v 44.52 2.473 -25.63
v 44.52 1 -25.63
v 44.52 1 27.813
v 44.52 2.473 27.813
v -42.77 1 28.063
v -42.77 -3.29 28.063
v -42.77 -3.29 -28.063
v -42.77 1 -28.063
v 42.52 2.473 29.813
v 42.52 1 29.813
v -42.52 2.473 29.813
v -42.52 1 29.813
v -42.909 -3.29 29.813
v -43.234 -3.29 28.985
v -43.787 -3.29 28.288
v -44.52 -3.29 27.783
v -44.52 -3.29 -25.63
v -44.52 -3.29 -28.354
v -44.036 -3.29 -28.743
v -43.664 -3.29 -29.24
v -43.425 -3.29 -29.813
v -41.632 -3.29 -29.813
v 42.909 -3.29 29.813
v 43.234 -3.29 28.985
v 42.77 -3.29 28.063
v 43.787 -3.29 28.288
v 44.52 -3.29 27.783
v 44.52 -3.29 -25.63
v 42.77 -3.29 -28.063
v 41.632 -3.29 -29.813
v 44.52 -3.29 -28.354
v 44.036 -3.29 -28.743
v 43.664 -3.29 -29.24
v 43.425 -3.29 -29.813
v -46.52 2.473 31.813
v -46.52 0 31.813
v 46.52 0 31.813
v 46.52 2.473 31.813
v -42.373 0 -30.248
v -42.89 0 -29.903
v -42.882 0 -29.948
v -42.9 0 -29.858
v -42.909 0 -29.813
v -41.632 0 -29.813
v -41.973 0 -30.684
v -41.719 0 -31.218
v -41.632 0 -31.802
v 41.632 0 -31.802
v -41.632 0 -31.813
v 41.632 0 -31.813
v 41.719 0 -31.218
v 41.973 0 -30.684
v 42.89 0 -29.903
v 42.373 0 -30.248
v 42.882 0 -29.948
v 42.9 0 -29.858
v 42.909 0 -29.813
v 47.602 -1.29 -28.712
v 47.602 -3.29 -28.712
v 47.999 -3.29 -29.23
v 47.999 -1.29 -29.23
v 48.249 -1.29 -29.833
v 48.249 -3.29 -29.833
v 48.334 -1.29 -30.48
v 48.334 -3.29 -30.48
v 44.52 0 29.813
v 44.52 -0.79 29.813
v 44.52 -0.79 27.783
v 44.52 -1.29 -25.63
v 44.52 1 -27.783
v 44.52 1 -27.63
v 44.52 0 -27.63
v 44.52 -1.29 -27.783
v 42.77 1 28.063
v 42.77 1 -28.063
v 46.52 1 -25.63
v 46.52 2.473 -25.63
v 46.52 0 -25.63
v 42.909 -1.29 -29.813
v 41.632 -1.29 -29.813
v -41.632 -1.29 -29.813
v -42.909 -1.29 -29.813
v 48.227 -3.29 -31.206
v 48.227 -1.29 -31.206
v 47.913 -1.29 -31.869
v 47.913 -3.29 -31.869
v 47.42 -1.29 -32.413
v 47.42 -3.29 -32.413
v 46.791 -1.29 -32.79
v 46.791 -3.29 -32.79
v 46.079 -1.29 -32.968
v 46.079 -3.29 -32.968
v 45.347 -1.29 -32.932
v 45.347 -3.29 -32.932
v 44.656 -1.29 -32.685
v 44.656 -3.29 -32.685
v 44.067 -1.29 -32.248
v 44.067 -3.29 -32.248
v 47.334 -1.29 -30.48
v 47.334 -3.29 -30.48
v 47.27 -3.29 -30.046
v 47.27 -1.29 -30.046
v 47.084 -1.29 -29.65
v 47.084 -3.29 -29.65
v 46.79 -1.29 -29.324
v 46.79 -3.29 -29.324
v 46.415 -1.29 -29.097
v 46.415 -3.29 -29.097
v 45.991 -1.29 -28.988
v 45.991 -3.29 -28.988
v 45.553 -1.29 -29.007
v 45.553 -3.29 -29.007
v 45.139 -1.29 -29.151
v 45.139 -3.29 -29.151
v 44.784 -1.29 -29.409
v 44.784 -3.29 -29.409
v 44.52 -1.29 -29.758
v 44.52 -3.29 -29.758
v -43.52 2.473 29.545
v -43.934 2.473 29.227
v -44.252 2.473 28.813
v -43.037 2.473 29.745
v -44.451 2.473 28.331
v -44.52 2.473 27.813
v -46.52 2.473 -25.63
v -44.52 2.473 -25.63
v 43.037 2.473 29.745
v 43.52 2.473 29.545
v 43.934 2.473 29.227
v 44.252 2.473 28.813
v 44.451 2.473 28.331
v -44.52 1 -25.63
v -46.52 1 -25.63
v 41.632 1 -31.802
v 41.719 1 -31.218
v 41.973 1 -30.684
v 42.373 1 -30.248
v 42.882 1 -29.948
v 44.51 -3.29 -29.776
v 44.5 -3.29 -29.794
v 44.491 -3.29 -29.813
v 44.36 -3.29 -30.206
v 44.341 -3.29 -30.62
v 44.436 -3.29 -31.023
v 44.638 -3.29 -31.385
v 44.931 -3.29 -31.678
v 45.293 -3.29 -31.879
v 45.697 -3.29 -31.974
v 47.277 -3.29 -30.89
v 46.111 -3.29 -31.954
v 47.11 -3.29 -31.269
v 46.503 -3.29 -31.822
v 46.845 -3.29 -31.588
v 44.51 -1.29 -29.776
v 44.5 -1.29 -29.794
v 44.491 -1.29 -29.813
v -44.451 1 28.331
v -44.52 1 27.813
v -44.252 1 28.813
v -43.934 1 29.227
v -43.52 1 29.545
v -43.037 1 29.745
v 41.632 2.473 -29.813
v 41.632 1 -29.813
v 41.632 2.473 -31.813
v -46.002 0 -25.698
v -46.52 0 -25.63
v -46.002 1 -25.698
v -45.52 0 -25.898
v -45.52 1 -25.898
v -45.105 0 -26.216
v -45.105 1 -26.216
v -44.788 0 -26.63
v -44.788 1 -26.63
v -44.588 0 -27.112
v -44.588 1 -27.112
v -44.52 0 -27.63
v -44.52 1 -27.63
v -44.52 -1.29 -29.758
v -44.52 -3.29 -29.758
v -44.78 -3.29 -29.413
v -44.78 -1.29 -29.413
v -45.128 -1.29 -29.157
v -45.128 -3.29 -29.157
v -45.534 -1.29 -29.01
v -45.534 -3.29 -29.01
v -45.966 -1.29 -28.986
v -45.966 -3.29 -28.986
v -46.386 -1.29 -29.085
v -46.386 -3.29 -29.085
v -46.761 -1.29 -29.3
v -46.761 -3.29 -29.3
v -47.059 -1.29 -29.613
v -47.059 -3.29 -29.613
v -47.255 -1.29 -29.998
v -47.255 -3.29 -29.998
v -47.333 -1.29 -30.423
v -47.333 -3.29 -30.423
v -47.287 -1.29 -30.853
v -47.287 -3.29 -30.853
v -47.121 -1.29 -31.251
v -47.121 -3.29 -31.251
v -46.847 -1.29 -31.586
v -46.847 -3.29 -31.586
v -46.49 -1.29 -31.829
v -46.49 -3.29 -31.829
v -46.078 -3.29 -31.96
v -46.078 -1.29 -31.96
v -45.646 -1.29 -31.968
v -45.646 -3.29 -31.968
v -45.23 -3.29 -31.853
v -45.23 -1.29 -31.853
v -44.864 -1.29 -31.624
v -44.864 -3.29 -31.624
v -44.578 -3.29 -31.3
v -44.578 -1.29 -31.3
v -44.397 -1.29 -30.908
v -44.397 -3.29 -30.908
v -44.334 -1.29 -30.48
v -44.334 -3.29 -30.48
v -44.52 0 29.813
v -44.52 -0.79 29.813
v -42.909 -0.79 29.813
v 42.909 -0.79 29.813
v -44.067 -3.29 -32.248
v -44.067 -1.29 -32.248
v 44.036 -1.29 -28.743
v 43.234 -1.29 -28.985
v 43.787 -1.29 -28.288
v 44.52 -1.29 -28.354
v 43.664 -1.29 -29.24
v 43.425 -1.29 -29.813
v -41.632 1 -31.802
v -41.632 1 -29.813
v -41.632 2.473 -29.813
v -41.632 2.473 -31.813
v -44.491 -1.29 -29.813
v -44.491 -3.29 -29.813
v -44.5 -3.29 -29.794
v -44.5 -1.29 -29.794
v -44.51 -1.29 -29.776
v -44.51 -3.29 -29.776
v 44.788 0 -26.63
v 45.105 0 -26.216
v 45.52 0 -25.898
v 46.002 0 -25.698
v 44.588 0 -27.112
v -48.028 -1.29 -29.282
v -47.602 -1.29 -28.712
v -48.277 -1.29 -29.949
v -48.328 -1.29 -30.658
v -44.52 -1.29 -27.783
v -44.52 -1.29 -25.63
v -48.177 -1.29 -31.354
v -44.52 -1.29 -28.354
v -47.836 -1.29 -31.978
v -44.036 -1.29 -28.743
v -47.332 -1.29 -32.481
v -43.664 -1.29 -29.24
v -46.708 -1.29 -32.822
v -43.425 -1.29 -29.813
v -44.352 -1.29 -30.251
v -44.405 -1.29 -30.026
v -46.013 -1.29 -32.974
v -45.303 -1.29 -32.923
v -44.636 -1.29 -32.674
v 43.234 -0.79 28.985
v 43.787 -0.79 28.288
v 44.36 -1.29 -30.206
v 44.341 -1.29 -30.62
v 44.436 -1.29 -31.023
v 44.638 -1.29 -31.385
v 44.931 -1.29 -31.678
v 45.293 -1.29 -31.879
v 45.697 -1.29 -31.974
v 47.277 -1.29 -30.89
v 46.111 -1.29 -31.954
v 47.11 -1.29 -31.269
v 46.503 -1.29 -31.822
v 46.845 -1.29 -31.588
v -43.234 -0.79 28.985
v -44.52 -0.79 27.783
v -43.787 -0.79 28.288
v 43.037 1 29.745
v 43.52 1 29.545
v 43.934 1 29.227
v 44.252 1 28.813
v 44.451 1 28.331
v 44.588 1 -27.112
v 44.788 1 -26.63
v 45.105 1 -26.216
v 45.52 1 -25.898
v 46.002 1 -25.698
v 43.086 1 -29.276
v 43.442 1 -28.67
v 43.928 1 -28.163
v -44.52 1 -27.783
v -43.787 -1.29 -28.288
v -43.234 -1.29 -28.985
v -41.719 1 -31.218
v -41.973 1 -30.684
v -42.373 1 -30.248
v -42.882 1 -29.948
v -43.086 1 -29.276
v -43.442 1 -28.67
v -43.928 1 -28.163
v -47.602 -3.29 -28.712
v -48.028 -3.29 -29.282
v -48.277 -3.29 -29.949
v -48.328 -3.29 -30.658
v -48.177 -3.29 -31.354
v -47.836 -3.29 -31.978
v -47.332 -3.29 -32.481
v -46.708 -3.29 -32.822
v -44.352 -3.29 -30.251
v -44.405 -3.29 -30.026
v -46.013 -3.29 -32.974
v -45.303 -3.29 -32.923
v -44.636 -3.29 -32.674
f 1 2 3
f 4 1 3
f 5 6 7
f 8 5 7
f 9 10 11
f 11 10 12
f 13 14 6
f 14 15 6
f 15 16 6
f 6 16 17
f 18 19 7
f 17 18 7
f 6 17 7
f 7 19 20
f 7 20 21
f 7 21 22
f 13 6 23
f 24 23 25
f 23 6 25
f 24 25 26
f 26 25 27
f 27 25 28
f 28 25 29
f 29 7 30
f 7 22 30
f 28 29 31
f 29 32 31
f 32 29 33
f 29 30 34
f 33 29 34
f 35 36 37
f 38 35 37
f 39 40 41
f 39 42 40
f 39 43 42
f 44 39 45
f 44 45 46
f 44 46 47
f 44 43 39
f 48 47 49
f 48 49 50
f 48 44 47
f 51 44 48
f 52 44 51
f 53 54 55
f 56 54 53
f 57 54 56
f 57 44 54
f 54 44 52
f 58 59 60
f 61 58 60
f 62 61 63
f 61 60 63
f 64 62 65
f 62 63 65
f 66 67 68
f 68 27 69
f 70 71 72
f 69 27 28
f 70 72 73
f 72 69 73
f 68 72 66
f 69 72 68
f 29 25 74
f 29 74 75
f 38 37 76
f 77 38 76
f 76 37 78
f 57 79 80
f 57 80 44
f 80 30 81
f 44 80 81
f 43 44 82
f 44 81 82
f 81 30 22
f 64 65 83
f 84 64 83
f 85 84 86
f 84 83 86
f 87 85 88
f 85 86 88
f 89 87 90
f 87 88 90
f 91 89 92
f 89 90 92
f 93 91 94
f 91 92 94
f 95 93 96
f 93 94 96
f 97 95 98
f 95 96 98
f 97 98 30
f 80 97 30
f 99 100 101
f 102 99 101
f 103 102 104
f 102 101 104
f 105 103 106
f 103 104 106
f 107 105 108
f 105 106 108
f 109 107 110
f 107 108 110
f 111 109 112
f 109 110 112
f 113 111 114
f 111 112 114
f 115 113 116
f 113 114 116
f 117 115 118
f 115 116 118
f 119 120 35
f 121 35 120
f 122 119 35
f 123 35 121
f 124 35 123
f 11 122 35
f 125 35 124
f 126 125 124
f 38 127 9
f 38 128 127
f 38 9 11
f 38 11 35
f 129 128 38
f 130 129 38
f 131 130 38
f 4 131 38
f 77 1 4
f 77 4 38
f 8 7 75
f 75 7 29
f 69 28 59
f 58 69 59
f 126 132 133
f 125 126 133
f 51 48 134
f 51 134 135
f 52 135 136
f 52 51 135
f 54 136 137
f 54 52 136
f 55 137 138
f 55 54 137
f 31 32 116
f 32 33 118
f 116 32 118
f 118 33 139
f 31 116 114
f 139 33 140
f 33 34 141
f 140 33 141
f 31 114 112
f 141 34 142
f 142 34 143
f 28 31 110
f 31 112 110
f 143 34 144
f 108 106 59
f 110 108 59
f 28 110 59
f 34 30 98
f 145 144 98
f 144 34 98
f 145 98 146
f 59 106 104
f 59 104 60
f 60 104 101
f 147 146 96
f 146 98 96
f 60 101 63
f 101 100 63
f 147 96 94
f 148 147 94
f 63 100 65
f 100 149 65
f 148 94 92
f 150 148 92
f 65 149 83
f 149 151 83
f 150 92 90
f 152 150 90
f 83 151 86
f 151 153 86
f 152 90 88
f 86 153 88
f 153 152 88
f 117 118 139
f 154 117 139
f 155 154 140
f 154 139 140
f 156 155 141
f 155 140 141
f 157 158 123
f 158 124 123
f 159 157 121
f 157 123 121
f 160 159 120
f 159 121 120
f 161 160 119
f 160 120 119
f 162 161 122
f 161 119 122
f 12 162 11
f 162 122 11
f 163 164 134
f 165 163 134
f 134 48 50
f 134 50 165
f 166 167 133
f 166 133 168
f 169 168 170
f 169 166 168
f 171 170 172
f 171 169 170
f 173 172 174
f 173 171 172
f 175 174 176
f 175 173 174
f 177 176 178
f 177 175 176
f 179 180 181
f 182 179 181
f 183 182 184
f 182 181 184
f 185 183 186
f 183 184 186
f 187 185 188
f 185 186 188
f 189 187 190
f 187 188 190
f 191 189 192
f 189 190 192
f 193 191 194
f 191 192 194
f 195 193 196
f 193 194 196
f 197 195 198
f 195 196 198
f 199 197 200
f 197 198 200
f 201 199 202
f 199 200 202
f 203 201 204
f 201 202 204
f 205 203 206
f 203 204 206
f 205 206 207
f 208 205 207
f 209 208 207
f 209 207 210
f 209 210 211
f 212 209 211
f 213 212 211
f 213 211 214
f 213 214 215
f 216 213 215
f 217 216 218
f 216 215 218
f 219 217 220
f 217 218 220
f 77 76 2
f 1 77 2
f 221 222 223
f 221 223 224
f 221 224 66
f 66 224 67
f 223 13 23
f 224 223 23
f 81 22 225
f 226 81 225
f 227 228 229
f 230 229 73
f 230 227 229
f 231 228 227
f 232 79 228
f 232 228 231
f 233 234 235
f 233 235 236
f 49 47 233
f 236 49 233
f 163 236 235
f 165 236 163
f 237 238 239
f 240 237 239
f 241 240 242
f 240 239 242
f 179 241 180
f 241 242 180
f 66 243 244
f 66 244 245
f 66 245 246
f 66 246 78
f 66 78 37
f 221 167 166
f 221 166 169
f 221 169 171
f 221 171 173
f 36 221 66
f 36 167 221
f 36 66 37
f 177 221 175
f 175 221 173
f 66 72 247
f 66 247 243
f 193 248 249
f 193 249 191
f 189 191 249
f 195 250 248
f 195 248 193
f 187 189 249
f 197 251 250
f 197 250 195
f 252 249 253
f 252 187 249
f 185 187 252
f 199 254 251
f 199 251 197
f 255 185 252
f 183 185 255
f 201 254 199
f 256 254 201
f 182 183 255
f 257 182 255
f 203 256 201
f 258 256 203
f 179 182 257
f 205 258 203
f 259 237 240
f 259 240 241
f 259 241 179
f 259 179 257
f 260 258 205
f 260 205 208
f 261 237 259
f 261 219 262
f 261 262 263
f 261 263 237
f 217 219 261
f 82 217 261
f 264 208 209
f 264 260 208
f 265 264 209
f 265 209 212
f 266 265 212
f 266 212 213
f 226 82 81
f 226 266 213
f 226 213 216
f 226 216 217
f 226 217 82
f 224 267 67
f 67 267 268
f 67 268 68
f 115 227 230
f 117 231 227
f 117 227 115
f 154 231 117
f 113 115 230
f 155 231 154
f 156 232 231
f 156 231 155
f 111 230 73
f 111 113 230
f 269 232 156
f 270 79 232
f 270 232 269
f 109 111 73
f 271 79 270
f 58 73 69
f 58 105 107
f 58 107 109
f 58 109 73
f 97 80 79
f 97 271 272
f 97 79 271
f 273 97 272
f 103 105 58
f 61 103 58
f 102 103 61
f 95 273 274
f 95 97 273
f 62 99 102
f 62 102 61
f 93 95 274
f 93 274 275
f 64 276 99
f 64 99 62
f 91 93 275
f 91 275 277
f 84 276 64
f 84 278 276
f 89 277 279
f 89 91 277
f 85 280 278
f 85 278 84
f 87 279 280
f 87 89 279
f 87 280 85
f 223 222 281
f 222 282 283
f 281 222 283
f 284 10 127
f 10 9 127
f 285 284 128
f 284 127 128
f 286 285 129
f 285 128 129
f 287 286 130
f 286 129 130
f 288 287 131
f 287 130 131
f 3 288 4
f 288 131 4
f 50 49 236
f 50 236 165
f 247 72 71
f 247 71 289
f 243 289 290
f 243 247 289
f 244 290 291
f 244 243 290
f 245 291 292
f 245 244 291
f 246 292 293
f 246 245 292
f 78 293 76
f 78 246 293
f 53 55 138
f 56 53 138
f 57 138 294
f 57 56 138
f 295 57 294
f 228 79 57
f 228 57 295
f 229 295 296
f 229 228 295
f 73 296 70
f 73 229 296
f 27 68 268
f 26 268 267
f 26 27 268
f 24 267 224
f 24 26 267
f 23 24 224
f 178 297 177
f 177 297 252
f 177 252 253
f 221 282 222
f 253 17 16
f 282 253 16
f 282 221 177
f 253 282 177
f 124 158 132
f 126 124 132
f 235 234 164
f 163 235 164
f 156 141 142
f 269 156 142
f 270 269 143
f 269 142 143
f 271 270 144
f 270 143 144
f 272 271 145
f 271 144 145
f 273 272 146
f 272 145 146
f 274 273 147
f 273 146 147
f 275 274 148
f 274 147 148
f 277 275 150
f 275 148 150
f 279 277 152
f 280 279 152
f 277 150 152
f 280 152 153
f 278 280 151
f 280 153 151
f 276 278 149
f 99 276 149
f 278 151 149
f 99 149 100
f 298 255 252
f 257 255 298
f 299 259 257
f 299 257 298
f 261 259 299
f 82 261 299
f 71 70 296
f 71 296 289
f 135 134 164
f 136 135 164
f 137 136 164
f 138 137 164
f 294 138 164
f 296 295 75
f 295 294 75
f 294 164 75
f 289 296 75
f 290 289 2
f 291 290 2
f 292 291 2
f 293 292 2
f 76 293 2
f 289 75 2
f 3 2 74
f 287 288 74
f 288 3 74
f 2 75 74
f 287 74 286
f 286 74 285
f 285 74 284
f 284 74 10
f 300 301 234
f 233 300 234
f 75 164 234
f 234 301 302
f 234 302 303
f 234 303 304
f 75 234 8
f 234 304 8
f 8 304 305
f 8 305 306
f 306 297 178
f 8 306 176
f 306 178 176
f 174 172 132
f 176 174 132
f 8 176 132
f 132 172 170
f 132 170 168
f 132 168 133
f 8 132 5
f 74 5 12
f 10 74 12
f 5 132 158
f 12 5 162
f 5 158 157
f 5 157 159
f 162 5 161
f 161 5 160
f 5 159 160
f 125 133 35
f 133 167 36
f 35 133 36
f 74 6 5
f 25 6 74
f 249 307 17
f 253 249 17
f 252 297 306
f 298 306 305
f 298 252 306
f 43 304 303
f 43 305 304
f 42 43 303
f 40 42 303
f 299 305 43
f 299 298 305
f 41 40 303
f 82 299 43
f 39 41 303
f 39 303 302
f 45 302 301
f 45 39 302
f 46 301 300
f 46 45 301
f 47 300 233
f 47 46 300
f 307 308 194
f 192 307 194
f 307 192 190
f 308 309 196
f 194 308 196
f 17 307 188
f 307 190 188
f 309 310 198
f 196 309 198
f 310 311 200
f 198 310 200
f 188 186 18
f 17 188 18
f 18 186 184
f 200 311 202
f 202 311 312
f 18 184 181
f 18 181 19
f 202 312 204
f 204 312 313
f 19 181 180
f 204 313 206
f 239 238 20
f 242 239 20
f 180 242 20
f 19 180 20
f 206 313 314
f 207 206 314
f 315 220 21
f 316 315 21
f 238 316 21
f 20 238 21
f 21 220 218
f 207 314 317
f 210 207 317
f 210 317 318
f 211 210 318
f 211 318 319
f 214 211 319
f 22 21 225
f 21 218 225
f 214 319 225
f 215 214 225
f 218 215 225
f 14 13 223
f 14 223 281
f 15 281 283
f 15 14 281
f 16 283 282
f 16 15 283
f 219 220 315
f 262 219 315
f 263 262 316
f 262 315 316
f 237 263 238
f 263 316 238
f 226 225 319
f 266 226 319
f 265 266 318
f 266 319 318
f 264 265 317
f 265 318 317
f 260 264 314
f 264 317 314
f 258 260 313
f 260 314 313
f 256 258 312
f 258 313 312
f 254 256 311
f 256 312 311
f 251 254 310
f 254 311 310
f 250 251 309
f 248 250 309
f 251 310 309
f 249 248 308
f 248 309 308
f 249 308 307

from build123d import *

# Parameters (mm, degrees)
SKETCH1_W             = 83.263532188
SKETCH1_H             = 2
BOSS_EXTRUDE1_DEPTH   = 2.4732
BOSS_EXTRUDE1_2_DEPTH = 2.4732
SKETCH1_3_W           = 85.5392
SKETCH1_3_H           = 56.126
BOSS_EXTRUDE2_DEPTH   = 1
BOSS_EXTRUDE3_START   = -3.29023885
SKETCH1_4_W           = 85.5392
SKETCH1_4_H           = 56.126
BOSS_EXTRUDE3_DEPTH   = 3.29023885
BOSS_EXTRUDE4_START   = -3.290239
BOSS_EXTRUDE4_DEPTH   = 2
FILLET1_R             = 2
FILLET2_R             = 2
SKETCH2_R             = 3
CUT_EXTRUDE1_DEPTH    = 3
CUT_EXTRUDE2_START    = -2
SKETCH2_3_R           = 3
CUT_EXTRUDE2_DEPTH    = 2.5


with BuildPart() as part:
    # Sketch1 → Boss-Extrude1 (new body)
    with BuildSketch(Plane(origin=(0, 0, 0), x_dir=(1, 0, 0), z_dir=(0, 1, 0))):
        with Locations((0, 30.813)):
            Rectangle(SKETCH1_W, SKETCH1_H)
    extrude(amount=BOSS_EXTRUDE1_DEPTH)



with BuildPart() as body_2:
    # Sketch1 → Boss-Extrude1 2 (new body)
    with BuildSketch(Plane(origin=(0, 0, 0), x_dir=(1, 0, 0), z_dir=(0, 1, 0))):
        Polygon((-44.5196, -29.813), (-44.5196, 25.629766094), (-46.5196, 25.629766094), (-46.5196, -31.813), (46.5196, -31.813), (46.5196, 25.629766094), (44.5196, 25.629766094), (44.5196, -29.813), align=None)
    extrude(amount=BOSS_EXTRUDE1_2_DEPTH)


with BuildPart() as part_1:
    add(part.part)

    add(body_2.part)  # Boss-Extrude2 merges body 2
    # Sketch1<3> → Boss-Extrude2 (add)
    with BuildSketch(Plane(origin=(0, 0, 0), x_dir=(1, 0, 0), z_dir=(0, 1, 0))):
        with BuildLine():
            Line((41.631766094, 29.813), (-41.631766094, 29.813))
            Line((-41.631766094, 29.813), (-43.424920204, 29.813))
            ThreePointArc((-43.424920204, 29.813), (-43.834386894, 28.979884149), (-44.5196, 28.353603069))
            Line((-44.5196, 28.353603069), (-44.5196, 25.629766094))
            Line((-44.5196, 25.629766094), (-44.5196, -29.813))
            Line((-44.5196, -29.813), (44.5196, -29.813))
            Line((44.5196, -29.813), (44.5196, 25.629766094))
            Line((44.5196, 25.629766094), (44.5196, 28.353603069))
            ThreePointArc((44.5196, 28.353603069), (43.834386894, 28.979884149), (43.424920204, 29.813))
            Line((43.424920204, 29.813), (41.631766094, 29.813))
        make_face()
        Rectangle(SKETCH1_3_W, SKETCH1_3_H, mode=Mode.SUBTRACT)
    extrude(amount=BOSS_EXTRUDE2_DEPTH)

    # Sketch1<4> → Boss-Extrude3 (add)
    with BuildSketch(Plane(origin=(0, 0, 0), x_dir=(1, 0, 0), z_dir=(0, 1, 0)).offset(BOSS_EXTRUDE3_START)):
        with BuildLine():
            Line((41.631766094, 29.813), (-41.631766094, 29.813))
            Line((-41.631766094, 29.813), (-43.424920204, 29.813))
            ThreePointArc((-43.424920204, 29.813), (-43.834386894, 28.979884149), (-44.5196, 28.353603069))
            Line((-44.5196, 28.353603069), (-44.5196, 25.629766094))
            Line((-44.5196, 25.629766094), (-44.5196, -29.813))
            Line((-44.5196, -29.813), (44.5196, -29.813))
            Line((44.5196, -29.813), (44.5196, 25.629766094))
            Line((44.5196, 25.629766094), (44.5196, 28.353603069))
            ThreePointArc((44.5196, 28.353603069), (43.834386894, 28.979884149), (43.424920204, 29.813))
            Line((43.424920204, 29.813), (41.631766094, 29.813))
        make_face()
        Rectangle(SKETCH1_4_W, SKETCH1_4_H, mode=Mode.SUBTRACT)
    extrude(amount=BOSS_EXTRUDE3_DEPTH)

    # Sketch1<5> → Boss-Extrude4 (add)
    with BuildSketch(Plane(origin=(0, 0, 0), x_dir=(1, 0, 0), z_dir=(0, 1, 0)).offset(BOSS_EXTRUDE4_START)):
        with BuildLine():
            ThreePointArc((-43.3343, 30.48), (-43.524601169, 31.436708581), (-44.066533047, 32.247766953))
            ThreePointArc((-44.066533047, 32.247766953), (-47.602066953, 32.247766953), (-47.602066953, 28.712233047))
            ThreePointArc((-47.602066953, 28.712233047), (-46.123213969, 27.996750371), (-44.5196, 28.353603069))
            Line((-44.5196, 28.353603069), (-44.5196, 29.757806183))
            ThreePointArc((-44.5196, 29.757806183), (-47.287236681, 30.852793509), (-44.3343, 30.48))
            ThreePointArc((-44.3343, 30.48), (-44.373937666, 30.137448026), (-44.490755806, 29.813))
            Line((-44.490755806, 29.813), (-43.424920204, 29.813))
            ThreePointArc((-43.424920204, 29.813), (-43.357058642, 30.143436105), (-43.3343, 30.48))
        make_face()
        with BuildLine():
            ThreePointArc((-44.5196, 28.353603069), (-43.834386894, 28.979884149), (-43.424920204, 29.813))
            Line((-43.424920204, 29.813), (-44.490755806, 29.813))
            ThreePointArc((-44.490755806, 29.813), (-44.504891433, 29.785253383), (-44.5196, 29.757806183))
            Line((-44.5196, 29.757806183), (-44.5196, 28.353603069))
        make_face()
        with BuildLine():
            ThreePointArc((-44.5196, 28.353603069), (-46.123213969, 27.996750371), (-47.602066953, 28.712233047))
            Line((-47.602066953, 28.712233047), (-44.5196, 25.629766094))
            Line((-44.5196, 25.629766094), (-44.5196, 28.353603069))
        make_face()
        with BuildLine():
            Line((-41.631766094, 29.813), (-44.066533047, 32.247766953))
            ThreePointArc((-44.066533047, 32.247766953), (-43.524601169, 31.436708581), (-43.3343, 30.48))
            ThreePointArc((-43.3343, 30.48), (-43.357058642, 30.143436105), (-43.424920204, 29.813))
            Line((-43.424920204, 29.813), (-41.631766094, 29.813))
        make_face()
        with BuildLine():
            ThreePointArc((44.066533047, 32.247766953), (43.416829986, 31.117054732), (43.424920204, 29.813))
            Line((43.424920204, 29.813), (44.490755806, 29.813))
            ThreePointArc((44.490755806, 29.813), (45.491748026, 31.940362334), (47.3343, 30.48))
            ThreePointArc((47.3343, 30.48), (46.207093509, 29.027063319), (44.5196, 29.757806183))
            Line((44.5196, 29.757806183), (44.5196, 28.353603069))
            ThreePointArc((44.5196, 28.353603069), (46.123213969, 27.996750371), (47.602066953, 28.712233047))
            ThreePointArc((47.602066953, 28.712233047), (48.143998831, 29.523291419), (48.3343, 30.48))
            ThreePointArc((48.3343, 30.48), (46.791008581, 32.789698831), (44.066533047, 32.247766953))
        make_face()
        with BuildLine():
            Line((44.490755806, 29.813), (43.424920204, 29.813))
            ThreePointArc((43.424920204, 29.813), (43.834386894, 28.979884149), (44.5196, 28.353603069))
            Line((44.5196, 28.353603069), (44.5196, 29.757806183))
            ThreePointArc((44.5196, 29.757806183), (44.504891433, 29.785253383), (44.490755806, 29.813))
        make_face()
        with BuildLine():
            Line((44.066533047, 32.247766953), (41.631766094, 29.813))
            Line((41.631766094, 29.813), (43.424920204, 29.813))
            ThreePointArc((43.424920204, 29.813), (43.416829986, 31.117054732), (44.066533047, 32.247766953))
        make_face()
        with BuildLine():
            ThreePointArc((47.602066953, 28.712233047), (46.123213969, 27.996750371), (44.5196, 28.353603069))
            Line((44.5196, 28.353603069), (44.5196, 25.629766094))
            Line((44.5196, 25.629766094), (47.602066953, 28.712233047))
        make_face()
    extrude(amount=BOSS_EXTRUDE4_DEPTH)

    # Fillet1
    # the kernel refuses this fillet: 2 mm, written as the material it adds along each edge
    with BuildSketch(Plane(origin=(44.5196, 0, -25.629766094), x_dir=(0, 0, -1), z_dir=(0, 1, 0))) as fillet1_piece_1:
        with BuildLine():
            CenterArc((FILLET1_R, -FILLET1_R), FILLET1_R, 90, 90)
            Line((0, -FILLET1_R), (0, 0))
            Line((0, 0), (FILLET1_R, 0))
        make_face()
    extrude(amount=1)
    with BuildSketch(Plane(origin=(41.631766094, 0, -29.813), x_dir=(0, 0, -1), z_dir=(0, 1, 0))) as fillet1_piece_2:
        with BuildLine():
            CenterArc((1.989274938, -2), FILLET1_R, 90, 84.063686733)
            Line((0, -1.79315411), (0, 0))
            Line((0, 0), (1.989274938, 0))
        make_face()
    extrude(amount=1)
    with BuildSketch(Plane(origin=(-41.631766094, 0, -29.813), x_dir=(-1, 0, 0), z_dir=(0, 1, 0))) as fillet1_piece_3:
        with BuildLine():
            CenterArc((2, -1.989274938), FILLET1_R, 95.936313267, 84.063686733)
            Line((0, -1.989274938), (0, 0))
            Line((0, 0), (1.79315411, 0))
        make_face()
    extrude(amount=1)
    with BuildSketch(Plane(origin=(-44.5196, 0, -25.629766094), x_dir=(0, 0, -1), z_dir=(0, 1, 0))) as fillet1_piece_4:
        with BuildLine():
            CenterArc((FILLET1_R, FILLET1_R), FILLET1_R, 180, 90)
            Line((0, FILLET1_R), (0, 0))
            Line((0, 0), (FILLET1_R, 0))
        make_face()
    extrude(amount=1)

    # Fillet2
    fillet2_edges = [part_1.edges().sort_by_distance(p)[0] for p in [
        (-44.5196, 1.7366, 29.813),
        (44.5196, 1.7366, 29.813),
    ]]
    fillet(fillet2_edges, radius=FILLET2_R)

    # Sketch2 → Cut-Extrude1 (cut)
    with BuildSketch(Plane(origin=(0, -1.29023885, 0), x_dir=(1, 0, 0), z_dir=(0, 1, 0))):
        with Locations((-45.8343, 30.48)):
            Circle(SKETCH2_R)
        with Locations((45.8343, 30.48)):
            Circle(SKETCH2_R)
    extrude(amount=CUT_EXTRUDE1_DEPTH, mode=Mode.SUBTRACT)

    # Sketch2<3> → Cut-Extrude2 (cut)
    with BuildSketch(Plane(origin=(0, -1.29023885, 0), x_dir=(1, 0, 0), z_dir=(0, 1, 0)).offset(CUT_EXTRUDE2_START)):
        with Locations((-45.8343, -30.48)):
            Circle(SKETCH2_3_R)
        with Locations((45.8343, -30.48)):
            Circle(SKETCH2_3_R)
    extrude(amount=CUT_EXTRUDE2_DEPTH, mode=Mode.SUBTRACT)


solid = part_1.part
